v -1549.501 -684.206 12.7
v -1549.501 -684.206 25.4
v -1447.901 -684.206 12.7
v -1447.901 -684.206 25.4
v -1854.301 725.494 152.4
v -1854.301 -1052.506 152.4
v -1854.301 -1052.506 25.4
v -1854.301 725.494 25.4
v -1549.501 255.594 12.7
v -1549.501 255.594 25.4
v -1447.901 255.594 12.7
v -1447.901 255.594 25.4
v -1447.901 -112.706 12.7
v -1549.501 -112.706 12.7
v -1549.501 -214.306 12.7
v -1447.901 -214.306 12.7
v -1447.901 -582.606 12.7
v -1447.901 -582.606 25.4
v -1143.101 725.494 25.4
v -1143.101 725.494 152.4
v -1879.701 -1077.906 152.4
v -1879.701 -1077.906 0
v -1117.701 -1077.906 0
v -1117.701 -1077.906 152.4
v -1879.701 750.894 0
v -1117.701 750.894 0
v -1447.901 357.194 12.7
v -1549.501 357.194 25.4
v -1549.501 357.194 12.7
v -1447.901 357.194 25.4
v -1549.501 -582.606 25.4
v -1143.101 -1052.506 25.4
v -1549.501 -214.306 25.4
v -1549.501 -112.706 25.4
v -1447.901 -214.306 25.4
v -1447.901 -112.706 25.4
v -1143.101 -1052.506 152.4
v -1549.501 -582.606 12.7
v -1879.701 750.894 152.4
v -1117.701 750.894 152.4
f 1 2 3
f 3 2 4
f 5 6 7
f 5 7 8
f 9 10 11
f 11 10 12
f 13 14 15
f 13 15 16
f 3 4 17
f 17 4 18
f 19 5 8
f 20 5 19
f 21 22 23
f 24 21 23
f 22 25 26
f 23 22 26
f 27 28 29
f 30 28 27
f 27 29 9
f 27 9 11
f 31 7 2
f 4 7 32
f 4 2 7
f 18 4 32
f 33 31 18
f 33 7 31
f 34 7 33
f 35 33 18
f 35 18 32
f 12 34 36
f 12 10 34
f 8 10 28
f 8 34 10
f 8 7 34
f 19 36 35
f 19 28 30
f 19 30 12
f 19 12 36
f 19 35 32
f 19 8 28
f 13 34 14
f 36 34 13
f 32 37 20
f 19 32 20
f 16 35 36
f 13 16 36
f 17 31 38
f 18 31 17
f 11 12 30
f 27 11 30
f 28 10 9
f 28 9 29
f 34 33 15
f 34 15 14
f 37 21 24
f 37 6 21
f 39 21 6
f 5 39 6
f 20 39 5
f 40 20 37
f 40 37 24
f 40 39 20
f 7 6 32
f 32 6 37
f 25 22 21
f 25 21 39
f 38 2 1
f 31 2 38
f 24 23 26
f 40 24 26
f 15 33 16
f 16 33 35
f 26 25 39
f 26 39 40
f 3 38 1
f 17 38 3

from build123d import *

# Parameters (mm, degrees)
SKETCH1_W           = 762
SKETCH1_H           = 1828.8
BOSS_EXTRUDE1_DEPTH = 152.4
SKETCH2_W           = 711.2
SKETCH2_H           = 1778
CUT_EXTRUDE3_DEPTH  = 127
SKETCH10_W          = 101.6
SKETCH10_H          = 101.6
CUT_EXTRUDE4_DEPTH  = 12.7


with BuildPart() as part:
    # Sketch1 → Boss-Extrude1 (new body)
    with BuildSketch(Plane.XY):
        with Locations((-1498.701019621, -163.505851304)):
            Rectangle(SKETCH1_W, SKETCH1_H)
    extrude(amount=BOSS_EXTRUDE1_DEPTH)

    # Sketch2 → Cut-Extrude3 (cut)
    with BuildSketch(Plane.XY.offset(152.4)):
        with Locations((-1498.701019621, -163.505851304)):
            Rectangle(SKETCH2_W, SKETCH2_H)
    extrude(amount=-CUT_EXTRUDE3_DEPTH, mode=Mode.SUBTRACT)

    # Sketch10 → Cut-Extrude4 (cut)
    with BuildSketch(Plane.XY.offset(25.4)):
        with Locations((-1498.701019621, 306.394148696)):
            Rectangle(SKETCH10_W, SKETCH10_H)
        with Locations((-1498.701019621, -163.505851304)):
            Rectangle(SKETCH10_W, SKETCH10_H)
        with Locations((-1498.701019621, -633.405851304)):
            Rectangle(SKETCH10_W, SKETCH10_H)
    extrude(amount=-CUT_EXTRUDE4_DEPTH, mode=Mode.SUBTRACT)


solid = part.part
